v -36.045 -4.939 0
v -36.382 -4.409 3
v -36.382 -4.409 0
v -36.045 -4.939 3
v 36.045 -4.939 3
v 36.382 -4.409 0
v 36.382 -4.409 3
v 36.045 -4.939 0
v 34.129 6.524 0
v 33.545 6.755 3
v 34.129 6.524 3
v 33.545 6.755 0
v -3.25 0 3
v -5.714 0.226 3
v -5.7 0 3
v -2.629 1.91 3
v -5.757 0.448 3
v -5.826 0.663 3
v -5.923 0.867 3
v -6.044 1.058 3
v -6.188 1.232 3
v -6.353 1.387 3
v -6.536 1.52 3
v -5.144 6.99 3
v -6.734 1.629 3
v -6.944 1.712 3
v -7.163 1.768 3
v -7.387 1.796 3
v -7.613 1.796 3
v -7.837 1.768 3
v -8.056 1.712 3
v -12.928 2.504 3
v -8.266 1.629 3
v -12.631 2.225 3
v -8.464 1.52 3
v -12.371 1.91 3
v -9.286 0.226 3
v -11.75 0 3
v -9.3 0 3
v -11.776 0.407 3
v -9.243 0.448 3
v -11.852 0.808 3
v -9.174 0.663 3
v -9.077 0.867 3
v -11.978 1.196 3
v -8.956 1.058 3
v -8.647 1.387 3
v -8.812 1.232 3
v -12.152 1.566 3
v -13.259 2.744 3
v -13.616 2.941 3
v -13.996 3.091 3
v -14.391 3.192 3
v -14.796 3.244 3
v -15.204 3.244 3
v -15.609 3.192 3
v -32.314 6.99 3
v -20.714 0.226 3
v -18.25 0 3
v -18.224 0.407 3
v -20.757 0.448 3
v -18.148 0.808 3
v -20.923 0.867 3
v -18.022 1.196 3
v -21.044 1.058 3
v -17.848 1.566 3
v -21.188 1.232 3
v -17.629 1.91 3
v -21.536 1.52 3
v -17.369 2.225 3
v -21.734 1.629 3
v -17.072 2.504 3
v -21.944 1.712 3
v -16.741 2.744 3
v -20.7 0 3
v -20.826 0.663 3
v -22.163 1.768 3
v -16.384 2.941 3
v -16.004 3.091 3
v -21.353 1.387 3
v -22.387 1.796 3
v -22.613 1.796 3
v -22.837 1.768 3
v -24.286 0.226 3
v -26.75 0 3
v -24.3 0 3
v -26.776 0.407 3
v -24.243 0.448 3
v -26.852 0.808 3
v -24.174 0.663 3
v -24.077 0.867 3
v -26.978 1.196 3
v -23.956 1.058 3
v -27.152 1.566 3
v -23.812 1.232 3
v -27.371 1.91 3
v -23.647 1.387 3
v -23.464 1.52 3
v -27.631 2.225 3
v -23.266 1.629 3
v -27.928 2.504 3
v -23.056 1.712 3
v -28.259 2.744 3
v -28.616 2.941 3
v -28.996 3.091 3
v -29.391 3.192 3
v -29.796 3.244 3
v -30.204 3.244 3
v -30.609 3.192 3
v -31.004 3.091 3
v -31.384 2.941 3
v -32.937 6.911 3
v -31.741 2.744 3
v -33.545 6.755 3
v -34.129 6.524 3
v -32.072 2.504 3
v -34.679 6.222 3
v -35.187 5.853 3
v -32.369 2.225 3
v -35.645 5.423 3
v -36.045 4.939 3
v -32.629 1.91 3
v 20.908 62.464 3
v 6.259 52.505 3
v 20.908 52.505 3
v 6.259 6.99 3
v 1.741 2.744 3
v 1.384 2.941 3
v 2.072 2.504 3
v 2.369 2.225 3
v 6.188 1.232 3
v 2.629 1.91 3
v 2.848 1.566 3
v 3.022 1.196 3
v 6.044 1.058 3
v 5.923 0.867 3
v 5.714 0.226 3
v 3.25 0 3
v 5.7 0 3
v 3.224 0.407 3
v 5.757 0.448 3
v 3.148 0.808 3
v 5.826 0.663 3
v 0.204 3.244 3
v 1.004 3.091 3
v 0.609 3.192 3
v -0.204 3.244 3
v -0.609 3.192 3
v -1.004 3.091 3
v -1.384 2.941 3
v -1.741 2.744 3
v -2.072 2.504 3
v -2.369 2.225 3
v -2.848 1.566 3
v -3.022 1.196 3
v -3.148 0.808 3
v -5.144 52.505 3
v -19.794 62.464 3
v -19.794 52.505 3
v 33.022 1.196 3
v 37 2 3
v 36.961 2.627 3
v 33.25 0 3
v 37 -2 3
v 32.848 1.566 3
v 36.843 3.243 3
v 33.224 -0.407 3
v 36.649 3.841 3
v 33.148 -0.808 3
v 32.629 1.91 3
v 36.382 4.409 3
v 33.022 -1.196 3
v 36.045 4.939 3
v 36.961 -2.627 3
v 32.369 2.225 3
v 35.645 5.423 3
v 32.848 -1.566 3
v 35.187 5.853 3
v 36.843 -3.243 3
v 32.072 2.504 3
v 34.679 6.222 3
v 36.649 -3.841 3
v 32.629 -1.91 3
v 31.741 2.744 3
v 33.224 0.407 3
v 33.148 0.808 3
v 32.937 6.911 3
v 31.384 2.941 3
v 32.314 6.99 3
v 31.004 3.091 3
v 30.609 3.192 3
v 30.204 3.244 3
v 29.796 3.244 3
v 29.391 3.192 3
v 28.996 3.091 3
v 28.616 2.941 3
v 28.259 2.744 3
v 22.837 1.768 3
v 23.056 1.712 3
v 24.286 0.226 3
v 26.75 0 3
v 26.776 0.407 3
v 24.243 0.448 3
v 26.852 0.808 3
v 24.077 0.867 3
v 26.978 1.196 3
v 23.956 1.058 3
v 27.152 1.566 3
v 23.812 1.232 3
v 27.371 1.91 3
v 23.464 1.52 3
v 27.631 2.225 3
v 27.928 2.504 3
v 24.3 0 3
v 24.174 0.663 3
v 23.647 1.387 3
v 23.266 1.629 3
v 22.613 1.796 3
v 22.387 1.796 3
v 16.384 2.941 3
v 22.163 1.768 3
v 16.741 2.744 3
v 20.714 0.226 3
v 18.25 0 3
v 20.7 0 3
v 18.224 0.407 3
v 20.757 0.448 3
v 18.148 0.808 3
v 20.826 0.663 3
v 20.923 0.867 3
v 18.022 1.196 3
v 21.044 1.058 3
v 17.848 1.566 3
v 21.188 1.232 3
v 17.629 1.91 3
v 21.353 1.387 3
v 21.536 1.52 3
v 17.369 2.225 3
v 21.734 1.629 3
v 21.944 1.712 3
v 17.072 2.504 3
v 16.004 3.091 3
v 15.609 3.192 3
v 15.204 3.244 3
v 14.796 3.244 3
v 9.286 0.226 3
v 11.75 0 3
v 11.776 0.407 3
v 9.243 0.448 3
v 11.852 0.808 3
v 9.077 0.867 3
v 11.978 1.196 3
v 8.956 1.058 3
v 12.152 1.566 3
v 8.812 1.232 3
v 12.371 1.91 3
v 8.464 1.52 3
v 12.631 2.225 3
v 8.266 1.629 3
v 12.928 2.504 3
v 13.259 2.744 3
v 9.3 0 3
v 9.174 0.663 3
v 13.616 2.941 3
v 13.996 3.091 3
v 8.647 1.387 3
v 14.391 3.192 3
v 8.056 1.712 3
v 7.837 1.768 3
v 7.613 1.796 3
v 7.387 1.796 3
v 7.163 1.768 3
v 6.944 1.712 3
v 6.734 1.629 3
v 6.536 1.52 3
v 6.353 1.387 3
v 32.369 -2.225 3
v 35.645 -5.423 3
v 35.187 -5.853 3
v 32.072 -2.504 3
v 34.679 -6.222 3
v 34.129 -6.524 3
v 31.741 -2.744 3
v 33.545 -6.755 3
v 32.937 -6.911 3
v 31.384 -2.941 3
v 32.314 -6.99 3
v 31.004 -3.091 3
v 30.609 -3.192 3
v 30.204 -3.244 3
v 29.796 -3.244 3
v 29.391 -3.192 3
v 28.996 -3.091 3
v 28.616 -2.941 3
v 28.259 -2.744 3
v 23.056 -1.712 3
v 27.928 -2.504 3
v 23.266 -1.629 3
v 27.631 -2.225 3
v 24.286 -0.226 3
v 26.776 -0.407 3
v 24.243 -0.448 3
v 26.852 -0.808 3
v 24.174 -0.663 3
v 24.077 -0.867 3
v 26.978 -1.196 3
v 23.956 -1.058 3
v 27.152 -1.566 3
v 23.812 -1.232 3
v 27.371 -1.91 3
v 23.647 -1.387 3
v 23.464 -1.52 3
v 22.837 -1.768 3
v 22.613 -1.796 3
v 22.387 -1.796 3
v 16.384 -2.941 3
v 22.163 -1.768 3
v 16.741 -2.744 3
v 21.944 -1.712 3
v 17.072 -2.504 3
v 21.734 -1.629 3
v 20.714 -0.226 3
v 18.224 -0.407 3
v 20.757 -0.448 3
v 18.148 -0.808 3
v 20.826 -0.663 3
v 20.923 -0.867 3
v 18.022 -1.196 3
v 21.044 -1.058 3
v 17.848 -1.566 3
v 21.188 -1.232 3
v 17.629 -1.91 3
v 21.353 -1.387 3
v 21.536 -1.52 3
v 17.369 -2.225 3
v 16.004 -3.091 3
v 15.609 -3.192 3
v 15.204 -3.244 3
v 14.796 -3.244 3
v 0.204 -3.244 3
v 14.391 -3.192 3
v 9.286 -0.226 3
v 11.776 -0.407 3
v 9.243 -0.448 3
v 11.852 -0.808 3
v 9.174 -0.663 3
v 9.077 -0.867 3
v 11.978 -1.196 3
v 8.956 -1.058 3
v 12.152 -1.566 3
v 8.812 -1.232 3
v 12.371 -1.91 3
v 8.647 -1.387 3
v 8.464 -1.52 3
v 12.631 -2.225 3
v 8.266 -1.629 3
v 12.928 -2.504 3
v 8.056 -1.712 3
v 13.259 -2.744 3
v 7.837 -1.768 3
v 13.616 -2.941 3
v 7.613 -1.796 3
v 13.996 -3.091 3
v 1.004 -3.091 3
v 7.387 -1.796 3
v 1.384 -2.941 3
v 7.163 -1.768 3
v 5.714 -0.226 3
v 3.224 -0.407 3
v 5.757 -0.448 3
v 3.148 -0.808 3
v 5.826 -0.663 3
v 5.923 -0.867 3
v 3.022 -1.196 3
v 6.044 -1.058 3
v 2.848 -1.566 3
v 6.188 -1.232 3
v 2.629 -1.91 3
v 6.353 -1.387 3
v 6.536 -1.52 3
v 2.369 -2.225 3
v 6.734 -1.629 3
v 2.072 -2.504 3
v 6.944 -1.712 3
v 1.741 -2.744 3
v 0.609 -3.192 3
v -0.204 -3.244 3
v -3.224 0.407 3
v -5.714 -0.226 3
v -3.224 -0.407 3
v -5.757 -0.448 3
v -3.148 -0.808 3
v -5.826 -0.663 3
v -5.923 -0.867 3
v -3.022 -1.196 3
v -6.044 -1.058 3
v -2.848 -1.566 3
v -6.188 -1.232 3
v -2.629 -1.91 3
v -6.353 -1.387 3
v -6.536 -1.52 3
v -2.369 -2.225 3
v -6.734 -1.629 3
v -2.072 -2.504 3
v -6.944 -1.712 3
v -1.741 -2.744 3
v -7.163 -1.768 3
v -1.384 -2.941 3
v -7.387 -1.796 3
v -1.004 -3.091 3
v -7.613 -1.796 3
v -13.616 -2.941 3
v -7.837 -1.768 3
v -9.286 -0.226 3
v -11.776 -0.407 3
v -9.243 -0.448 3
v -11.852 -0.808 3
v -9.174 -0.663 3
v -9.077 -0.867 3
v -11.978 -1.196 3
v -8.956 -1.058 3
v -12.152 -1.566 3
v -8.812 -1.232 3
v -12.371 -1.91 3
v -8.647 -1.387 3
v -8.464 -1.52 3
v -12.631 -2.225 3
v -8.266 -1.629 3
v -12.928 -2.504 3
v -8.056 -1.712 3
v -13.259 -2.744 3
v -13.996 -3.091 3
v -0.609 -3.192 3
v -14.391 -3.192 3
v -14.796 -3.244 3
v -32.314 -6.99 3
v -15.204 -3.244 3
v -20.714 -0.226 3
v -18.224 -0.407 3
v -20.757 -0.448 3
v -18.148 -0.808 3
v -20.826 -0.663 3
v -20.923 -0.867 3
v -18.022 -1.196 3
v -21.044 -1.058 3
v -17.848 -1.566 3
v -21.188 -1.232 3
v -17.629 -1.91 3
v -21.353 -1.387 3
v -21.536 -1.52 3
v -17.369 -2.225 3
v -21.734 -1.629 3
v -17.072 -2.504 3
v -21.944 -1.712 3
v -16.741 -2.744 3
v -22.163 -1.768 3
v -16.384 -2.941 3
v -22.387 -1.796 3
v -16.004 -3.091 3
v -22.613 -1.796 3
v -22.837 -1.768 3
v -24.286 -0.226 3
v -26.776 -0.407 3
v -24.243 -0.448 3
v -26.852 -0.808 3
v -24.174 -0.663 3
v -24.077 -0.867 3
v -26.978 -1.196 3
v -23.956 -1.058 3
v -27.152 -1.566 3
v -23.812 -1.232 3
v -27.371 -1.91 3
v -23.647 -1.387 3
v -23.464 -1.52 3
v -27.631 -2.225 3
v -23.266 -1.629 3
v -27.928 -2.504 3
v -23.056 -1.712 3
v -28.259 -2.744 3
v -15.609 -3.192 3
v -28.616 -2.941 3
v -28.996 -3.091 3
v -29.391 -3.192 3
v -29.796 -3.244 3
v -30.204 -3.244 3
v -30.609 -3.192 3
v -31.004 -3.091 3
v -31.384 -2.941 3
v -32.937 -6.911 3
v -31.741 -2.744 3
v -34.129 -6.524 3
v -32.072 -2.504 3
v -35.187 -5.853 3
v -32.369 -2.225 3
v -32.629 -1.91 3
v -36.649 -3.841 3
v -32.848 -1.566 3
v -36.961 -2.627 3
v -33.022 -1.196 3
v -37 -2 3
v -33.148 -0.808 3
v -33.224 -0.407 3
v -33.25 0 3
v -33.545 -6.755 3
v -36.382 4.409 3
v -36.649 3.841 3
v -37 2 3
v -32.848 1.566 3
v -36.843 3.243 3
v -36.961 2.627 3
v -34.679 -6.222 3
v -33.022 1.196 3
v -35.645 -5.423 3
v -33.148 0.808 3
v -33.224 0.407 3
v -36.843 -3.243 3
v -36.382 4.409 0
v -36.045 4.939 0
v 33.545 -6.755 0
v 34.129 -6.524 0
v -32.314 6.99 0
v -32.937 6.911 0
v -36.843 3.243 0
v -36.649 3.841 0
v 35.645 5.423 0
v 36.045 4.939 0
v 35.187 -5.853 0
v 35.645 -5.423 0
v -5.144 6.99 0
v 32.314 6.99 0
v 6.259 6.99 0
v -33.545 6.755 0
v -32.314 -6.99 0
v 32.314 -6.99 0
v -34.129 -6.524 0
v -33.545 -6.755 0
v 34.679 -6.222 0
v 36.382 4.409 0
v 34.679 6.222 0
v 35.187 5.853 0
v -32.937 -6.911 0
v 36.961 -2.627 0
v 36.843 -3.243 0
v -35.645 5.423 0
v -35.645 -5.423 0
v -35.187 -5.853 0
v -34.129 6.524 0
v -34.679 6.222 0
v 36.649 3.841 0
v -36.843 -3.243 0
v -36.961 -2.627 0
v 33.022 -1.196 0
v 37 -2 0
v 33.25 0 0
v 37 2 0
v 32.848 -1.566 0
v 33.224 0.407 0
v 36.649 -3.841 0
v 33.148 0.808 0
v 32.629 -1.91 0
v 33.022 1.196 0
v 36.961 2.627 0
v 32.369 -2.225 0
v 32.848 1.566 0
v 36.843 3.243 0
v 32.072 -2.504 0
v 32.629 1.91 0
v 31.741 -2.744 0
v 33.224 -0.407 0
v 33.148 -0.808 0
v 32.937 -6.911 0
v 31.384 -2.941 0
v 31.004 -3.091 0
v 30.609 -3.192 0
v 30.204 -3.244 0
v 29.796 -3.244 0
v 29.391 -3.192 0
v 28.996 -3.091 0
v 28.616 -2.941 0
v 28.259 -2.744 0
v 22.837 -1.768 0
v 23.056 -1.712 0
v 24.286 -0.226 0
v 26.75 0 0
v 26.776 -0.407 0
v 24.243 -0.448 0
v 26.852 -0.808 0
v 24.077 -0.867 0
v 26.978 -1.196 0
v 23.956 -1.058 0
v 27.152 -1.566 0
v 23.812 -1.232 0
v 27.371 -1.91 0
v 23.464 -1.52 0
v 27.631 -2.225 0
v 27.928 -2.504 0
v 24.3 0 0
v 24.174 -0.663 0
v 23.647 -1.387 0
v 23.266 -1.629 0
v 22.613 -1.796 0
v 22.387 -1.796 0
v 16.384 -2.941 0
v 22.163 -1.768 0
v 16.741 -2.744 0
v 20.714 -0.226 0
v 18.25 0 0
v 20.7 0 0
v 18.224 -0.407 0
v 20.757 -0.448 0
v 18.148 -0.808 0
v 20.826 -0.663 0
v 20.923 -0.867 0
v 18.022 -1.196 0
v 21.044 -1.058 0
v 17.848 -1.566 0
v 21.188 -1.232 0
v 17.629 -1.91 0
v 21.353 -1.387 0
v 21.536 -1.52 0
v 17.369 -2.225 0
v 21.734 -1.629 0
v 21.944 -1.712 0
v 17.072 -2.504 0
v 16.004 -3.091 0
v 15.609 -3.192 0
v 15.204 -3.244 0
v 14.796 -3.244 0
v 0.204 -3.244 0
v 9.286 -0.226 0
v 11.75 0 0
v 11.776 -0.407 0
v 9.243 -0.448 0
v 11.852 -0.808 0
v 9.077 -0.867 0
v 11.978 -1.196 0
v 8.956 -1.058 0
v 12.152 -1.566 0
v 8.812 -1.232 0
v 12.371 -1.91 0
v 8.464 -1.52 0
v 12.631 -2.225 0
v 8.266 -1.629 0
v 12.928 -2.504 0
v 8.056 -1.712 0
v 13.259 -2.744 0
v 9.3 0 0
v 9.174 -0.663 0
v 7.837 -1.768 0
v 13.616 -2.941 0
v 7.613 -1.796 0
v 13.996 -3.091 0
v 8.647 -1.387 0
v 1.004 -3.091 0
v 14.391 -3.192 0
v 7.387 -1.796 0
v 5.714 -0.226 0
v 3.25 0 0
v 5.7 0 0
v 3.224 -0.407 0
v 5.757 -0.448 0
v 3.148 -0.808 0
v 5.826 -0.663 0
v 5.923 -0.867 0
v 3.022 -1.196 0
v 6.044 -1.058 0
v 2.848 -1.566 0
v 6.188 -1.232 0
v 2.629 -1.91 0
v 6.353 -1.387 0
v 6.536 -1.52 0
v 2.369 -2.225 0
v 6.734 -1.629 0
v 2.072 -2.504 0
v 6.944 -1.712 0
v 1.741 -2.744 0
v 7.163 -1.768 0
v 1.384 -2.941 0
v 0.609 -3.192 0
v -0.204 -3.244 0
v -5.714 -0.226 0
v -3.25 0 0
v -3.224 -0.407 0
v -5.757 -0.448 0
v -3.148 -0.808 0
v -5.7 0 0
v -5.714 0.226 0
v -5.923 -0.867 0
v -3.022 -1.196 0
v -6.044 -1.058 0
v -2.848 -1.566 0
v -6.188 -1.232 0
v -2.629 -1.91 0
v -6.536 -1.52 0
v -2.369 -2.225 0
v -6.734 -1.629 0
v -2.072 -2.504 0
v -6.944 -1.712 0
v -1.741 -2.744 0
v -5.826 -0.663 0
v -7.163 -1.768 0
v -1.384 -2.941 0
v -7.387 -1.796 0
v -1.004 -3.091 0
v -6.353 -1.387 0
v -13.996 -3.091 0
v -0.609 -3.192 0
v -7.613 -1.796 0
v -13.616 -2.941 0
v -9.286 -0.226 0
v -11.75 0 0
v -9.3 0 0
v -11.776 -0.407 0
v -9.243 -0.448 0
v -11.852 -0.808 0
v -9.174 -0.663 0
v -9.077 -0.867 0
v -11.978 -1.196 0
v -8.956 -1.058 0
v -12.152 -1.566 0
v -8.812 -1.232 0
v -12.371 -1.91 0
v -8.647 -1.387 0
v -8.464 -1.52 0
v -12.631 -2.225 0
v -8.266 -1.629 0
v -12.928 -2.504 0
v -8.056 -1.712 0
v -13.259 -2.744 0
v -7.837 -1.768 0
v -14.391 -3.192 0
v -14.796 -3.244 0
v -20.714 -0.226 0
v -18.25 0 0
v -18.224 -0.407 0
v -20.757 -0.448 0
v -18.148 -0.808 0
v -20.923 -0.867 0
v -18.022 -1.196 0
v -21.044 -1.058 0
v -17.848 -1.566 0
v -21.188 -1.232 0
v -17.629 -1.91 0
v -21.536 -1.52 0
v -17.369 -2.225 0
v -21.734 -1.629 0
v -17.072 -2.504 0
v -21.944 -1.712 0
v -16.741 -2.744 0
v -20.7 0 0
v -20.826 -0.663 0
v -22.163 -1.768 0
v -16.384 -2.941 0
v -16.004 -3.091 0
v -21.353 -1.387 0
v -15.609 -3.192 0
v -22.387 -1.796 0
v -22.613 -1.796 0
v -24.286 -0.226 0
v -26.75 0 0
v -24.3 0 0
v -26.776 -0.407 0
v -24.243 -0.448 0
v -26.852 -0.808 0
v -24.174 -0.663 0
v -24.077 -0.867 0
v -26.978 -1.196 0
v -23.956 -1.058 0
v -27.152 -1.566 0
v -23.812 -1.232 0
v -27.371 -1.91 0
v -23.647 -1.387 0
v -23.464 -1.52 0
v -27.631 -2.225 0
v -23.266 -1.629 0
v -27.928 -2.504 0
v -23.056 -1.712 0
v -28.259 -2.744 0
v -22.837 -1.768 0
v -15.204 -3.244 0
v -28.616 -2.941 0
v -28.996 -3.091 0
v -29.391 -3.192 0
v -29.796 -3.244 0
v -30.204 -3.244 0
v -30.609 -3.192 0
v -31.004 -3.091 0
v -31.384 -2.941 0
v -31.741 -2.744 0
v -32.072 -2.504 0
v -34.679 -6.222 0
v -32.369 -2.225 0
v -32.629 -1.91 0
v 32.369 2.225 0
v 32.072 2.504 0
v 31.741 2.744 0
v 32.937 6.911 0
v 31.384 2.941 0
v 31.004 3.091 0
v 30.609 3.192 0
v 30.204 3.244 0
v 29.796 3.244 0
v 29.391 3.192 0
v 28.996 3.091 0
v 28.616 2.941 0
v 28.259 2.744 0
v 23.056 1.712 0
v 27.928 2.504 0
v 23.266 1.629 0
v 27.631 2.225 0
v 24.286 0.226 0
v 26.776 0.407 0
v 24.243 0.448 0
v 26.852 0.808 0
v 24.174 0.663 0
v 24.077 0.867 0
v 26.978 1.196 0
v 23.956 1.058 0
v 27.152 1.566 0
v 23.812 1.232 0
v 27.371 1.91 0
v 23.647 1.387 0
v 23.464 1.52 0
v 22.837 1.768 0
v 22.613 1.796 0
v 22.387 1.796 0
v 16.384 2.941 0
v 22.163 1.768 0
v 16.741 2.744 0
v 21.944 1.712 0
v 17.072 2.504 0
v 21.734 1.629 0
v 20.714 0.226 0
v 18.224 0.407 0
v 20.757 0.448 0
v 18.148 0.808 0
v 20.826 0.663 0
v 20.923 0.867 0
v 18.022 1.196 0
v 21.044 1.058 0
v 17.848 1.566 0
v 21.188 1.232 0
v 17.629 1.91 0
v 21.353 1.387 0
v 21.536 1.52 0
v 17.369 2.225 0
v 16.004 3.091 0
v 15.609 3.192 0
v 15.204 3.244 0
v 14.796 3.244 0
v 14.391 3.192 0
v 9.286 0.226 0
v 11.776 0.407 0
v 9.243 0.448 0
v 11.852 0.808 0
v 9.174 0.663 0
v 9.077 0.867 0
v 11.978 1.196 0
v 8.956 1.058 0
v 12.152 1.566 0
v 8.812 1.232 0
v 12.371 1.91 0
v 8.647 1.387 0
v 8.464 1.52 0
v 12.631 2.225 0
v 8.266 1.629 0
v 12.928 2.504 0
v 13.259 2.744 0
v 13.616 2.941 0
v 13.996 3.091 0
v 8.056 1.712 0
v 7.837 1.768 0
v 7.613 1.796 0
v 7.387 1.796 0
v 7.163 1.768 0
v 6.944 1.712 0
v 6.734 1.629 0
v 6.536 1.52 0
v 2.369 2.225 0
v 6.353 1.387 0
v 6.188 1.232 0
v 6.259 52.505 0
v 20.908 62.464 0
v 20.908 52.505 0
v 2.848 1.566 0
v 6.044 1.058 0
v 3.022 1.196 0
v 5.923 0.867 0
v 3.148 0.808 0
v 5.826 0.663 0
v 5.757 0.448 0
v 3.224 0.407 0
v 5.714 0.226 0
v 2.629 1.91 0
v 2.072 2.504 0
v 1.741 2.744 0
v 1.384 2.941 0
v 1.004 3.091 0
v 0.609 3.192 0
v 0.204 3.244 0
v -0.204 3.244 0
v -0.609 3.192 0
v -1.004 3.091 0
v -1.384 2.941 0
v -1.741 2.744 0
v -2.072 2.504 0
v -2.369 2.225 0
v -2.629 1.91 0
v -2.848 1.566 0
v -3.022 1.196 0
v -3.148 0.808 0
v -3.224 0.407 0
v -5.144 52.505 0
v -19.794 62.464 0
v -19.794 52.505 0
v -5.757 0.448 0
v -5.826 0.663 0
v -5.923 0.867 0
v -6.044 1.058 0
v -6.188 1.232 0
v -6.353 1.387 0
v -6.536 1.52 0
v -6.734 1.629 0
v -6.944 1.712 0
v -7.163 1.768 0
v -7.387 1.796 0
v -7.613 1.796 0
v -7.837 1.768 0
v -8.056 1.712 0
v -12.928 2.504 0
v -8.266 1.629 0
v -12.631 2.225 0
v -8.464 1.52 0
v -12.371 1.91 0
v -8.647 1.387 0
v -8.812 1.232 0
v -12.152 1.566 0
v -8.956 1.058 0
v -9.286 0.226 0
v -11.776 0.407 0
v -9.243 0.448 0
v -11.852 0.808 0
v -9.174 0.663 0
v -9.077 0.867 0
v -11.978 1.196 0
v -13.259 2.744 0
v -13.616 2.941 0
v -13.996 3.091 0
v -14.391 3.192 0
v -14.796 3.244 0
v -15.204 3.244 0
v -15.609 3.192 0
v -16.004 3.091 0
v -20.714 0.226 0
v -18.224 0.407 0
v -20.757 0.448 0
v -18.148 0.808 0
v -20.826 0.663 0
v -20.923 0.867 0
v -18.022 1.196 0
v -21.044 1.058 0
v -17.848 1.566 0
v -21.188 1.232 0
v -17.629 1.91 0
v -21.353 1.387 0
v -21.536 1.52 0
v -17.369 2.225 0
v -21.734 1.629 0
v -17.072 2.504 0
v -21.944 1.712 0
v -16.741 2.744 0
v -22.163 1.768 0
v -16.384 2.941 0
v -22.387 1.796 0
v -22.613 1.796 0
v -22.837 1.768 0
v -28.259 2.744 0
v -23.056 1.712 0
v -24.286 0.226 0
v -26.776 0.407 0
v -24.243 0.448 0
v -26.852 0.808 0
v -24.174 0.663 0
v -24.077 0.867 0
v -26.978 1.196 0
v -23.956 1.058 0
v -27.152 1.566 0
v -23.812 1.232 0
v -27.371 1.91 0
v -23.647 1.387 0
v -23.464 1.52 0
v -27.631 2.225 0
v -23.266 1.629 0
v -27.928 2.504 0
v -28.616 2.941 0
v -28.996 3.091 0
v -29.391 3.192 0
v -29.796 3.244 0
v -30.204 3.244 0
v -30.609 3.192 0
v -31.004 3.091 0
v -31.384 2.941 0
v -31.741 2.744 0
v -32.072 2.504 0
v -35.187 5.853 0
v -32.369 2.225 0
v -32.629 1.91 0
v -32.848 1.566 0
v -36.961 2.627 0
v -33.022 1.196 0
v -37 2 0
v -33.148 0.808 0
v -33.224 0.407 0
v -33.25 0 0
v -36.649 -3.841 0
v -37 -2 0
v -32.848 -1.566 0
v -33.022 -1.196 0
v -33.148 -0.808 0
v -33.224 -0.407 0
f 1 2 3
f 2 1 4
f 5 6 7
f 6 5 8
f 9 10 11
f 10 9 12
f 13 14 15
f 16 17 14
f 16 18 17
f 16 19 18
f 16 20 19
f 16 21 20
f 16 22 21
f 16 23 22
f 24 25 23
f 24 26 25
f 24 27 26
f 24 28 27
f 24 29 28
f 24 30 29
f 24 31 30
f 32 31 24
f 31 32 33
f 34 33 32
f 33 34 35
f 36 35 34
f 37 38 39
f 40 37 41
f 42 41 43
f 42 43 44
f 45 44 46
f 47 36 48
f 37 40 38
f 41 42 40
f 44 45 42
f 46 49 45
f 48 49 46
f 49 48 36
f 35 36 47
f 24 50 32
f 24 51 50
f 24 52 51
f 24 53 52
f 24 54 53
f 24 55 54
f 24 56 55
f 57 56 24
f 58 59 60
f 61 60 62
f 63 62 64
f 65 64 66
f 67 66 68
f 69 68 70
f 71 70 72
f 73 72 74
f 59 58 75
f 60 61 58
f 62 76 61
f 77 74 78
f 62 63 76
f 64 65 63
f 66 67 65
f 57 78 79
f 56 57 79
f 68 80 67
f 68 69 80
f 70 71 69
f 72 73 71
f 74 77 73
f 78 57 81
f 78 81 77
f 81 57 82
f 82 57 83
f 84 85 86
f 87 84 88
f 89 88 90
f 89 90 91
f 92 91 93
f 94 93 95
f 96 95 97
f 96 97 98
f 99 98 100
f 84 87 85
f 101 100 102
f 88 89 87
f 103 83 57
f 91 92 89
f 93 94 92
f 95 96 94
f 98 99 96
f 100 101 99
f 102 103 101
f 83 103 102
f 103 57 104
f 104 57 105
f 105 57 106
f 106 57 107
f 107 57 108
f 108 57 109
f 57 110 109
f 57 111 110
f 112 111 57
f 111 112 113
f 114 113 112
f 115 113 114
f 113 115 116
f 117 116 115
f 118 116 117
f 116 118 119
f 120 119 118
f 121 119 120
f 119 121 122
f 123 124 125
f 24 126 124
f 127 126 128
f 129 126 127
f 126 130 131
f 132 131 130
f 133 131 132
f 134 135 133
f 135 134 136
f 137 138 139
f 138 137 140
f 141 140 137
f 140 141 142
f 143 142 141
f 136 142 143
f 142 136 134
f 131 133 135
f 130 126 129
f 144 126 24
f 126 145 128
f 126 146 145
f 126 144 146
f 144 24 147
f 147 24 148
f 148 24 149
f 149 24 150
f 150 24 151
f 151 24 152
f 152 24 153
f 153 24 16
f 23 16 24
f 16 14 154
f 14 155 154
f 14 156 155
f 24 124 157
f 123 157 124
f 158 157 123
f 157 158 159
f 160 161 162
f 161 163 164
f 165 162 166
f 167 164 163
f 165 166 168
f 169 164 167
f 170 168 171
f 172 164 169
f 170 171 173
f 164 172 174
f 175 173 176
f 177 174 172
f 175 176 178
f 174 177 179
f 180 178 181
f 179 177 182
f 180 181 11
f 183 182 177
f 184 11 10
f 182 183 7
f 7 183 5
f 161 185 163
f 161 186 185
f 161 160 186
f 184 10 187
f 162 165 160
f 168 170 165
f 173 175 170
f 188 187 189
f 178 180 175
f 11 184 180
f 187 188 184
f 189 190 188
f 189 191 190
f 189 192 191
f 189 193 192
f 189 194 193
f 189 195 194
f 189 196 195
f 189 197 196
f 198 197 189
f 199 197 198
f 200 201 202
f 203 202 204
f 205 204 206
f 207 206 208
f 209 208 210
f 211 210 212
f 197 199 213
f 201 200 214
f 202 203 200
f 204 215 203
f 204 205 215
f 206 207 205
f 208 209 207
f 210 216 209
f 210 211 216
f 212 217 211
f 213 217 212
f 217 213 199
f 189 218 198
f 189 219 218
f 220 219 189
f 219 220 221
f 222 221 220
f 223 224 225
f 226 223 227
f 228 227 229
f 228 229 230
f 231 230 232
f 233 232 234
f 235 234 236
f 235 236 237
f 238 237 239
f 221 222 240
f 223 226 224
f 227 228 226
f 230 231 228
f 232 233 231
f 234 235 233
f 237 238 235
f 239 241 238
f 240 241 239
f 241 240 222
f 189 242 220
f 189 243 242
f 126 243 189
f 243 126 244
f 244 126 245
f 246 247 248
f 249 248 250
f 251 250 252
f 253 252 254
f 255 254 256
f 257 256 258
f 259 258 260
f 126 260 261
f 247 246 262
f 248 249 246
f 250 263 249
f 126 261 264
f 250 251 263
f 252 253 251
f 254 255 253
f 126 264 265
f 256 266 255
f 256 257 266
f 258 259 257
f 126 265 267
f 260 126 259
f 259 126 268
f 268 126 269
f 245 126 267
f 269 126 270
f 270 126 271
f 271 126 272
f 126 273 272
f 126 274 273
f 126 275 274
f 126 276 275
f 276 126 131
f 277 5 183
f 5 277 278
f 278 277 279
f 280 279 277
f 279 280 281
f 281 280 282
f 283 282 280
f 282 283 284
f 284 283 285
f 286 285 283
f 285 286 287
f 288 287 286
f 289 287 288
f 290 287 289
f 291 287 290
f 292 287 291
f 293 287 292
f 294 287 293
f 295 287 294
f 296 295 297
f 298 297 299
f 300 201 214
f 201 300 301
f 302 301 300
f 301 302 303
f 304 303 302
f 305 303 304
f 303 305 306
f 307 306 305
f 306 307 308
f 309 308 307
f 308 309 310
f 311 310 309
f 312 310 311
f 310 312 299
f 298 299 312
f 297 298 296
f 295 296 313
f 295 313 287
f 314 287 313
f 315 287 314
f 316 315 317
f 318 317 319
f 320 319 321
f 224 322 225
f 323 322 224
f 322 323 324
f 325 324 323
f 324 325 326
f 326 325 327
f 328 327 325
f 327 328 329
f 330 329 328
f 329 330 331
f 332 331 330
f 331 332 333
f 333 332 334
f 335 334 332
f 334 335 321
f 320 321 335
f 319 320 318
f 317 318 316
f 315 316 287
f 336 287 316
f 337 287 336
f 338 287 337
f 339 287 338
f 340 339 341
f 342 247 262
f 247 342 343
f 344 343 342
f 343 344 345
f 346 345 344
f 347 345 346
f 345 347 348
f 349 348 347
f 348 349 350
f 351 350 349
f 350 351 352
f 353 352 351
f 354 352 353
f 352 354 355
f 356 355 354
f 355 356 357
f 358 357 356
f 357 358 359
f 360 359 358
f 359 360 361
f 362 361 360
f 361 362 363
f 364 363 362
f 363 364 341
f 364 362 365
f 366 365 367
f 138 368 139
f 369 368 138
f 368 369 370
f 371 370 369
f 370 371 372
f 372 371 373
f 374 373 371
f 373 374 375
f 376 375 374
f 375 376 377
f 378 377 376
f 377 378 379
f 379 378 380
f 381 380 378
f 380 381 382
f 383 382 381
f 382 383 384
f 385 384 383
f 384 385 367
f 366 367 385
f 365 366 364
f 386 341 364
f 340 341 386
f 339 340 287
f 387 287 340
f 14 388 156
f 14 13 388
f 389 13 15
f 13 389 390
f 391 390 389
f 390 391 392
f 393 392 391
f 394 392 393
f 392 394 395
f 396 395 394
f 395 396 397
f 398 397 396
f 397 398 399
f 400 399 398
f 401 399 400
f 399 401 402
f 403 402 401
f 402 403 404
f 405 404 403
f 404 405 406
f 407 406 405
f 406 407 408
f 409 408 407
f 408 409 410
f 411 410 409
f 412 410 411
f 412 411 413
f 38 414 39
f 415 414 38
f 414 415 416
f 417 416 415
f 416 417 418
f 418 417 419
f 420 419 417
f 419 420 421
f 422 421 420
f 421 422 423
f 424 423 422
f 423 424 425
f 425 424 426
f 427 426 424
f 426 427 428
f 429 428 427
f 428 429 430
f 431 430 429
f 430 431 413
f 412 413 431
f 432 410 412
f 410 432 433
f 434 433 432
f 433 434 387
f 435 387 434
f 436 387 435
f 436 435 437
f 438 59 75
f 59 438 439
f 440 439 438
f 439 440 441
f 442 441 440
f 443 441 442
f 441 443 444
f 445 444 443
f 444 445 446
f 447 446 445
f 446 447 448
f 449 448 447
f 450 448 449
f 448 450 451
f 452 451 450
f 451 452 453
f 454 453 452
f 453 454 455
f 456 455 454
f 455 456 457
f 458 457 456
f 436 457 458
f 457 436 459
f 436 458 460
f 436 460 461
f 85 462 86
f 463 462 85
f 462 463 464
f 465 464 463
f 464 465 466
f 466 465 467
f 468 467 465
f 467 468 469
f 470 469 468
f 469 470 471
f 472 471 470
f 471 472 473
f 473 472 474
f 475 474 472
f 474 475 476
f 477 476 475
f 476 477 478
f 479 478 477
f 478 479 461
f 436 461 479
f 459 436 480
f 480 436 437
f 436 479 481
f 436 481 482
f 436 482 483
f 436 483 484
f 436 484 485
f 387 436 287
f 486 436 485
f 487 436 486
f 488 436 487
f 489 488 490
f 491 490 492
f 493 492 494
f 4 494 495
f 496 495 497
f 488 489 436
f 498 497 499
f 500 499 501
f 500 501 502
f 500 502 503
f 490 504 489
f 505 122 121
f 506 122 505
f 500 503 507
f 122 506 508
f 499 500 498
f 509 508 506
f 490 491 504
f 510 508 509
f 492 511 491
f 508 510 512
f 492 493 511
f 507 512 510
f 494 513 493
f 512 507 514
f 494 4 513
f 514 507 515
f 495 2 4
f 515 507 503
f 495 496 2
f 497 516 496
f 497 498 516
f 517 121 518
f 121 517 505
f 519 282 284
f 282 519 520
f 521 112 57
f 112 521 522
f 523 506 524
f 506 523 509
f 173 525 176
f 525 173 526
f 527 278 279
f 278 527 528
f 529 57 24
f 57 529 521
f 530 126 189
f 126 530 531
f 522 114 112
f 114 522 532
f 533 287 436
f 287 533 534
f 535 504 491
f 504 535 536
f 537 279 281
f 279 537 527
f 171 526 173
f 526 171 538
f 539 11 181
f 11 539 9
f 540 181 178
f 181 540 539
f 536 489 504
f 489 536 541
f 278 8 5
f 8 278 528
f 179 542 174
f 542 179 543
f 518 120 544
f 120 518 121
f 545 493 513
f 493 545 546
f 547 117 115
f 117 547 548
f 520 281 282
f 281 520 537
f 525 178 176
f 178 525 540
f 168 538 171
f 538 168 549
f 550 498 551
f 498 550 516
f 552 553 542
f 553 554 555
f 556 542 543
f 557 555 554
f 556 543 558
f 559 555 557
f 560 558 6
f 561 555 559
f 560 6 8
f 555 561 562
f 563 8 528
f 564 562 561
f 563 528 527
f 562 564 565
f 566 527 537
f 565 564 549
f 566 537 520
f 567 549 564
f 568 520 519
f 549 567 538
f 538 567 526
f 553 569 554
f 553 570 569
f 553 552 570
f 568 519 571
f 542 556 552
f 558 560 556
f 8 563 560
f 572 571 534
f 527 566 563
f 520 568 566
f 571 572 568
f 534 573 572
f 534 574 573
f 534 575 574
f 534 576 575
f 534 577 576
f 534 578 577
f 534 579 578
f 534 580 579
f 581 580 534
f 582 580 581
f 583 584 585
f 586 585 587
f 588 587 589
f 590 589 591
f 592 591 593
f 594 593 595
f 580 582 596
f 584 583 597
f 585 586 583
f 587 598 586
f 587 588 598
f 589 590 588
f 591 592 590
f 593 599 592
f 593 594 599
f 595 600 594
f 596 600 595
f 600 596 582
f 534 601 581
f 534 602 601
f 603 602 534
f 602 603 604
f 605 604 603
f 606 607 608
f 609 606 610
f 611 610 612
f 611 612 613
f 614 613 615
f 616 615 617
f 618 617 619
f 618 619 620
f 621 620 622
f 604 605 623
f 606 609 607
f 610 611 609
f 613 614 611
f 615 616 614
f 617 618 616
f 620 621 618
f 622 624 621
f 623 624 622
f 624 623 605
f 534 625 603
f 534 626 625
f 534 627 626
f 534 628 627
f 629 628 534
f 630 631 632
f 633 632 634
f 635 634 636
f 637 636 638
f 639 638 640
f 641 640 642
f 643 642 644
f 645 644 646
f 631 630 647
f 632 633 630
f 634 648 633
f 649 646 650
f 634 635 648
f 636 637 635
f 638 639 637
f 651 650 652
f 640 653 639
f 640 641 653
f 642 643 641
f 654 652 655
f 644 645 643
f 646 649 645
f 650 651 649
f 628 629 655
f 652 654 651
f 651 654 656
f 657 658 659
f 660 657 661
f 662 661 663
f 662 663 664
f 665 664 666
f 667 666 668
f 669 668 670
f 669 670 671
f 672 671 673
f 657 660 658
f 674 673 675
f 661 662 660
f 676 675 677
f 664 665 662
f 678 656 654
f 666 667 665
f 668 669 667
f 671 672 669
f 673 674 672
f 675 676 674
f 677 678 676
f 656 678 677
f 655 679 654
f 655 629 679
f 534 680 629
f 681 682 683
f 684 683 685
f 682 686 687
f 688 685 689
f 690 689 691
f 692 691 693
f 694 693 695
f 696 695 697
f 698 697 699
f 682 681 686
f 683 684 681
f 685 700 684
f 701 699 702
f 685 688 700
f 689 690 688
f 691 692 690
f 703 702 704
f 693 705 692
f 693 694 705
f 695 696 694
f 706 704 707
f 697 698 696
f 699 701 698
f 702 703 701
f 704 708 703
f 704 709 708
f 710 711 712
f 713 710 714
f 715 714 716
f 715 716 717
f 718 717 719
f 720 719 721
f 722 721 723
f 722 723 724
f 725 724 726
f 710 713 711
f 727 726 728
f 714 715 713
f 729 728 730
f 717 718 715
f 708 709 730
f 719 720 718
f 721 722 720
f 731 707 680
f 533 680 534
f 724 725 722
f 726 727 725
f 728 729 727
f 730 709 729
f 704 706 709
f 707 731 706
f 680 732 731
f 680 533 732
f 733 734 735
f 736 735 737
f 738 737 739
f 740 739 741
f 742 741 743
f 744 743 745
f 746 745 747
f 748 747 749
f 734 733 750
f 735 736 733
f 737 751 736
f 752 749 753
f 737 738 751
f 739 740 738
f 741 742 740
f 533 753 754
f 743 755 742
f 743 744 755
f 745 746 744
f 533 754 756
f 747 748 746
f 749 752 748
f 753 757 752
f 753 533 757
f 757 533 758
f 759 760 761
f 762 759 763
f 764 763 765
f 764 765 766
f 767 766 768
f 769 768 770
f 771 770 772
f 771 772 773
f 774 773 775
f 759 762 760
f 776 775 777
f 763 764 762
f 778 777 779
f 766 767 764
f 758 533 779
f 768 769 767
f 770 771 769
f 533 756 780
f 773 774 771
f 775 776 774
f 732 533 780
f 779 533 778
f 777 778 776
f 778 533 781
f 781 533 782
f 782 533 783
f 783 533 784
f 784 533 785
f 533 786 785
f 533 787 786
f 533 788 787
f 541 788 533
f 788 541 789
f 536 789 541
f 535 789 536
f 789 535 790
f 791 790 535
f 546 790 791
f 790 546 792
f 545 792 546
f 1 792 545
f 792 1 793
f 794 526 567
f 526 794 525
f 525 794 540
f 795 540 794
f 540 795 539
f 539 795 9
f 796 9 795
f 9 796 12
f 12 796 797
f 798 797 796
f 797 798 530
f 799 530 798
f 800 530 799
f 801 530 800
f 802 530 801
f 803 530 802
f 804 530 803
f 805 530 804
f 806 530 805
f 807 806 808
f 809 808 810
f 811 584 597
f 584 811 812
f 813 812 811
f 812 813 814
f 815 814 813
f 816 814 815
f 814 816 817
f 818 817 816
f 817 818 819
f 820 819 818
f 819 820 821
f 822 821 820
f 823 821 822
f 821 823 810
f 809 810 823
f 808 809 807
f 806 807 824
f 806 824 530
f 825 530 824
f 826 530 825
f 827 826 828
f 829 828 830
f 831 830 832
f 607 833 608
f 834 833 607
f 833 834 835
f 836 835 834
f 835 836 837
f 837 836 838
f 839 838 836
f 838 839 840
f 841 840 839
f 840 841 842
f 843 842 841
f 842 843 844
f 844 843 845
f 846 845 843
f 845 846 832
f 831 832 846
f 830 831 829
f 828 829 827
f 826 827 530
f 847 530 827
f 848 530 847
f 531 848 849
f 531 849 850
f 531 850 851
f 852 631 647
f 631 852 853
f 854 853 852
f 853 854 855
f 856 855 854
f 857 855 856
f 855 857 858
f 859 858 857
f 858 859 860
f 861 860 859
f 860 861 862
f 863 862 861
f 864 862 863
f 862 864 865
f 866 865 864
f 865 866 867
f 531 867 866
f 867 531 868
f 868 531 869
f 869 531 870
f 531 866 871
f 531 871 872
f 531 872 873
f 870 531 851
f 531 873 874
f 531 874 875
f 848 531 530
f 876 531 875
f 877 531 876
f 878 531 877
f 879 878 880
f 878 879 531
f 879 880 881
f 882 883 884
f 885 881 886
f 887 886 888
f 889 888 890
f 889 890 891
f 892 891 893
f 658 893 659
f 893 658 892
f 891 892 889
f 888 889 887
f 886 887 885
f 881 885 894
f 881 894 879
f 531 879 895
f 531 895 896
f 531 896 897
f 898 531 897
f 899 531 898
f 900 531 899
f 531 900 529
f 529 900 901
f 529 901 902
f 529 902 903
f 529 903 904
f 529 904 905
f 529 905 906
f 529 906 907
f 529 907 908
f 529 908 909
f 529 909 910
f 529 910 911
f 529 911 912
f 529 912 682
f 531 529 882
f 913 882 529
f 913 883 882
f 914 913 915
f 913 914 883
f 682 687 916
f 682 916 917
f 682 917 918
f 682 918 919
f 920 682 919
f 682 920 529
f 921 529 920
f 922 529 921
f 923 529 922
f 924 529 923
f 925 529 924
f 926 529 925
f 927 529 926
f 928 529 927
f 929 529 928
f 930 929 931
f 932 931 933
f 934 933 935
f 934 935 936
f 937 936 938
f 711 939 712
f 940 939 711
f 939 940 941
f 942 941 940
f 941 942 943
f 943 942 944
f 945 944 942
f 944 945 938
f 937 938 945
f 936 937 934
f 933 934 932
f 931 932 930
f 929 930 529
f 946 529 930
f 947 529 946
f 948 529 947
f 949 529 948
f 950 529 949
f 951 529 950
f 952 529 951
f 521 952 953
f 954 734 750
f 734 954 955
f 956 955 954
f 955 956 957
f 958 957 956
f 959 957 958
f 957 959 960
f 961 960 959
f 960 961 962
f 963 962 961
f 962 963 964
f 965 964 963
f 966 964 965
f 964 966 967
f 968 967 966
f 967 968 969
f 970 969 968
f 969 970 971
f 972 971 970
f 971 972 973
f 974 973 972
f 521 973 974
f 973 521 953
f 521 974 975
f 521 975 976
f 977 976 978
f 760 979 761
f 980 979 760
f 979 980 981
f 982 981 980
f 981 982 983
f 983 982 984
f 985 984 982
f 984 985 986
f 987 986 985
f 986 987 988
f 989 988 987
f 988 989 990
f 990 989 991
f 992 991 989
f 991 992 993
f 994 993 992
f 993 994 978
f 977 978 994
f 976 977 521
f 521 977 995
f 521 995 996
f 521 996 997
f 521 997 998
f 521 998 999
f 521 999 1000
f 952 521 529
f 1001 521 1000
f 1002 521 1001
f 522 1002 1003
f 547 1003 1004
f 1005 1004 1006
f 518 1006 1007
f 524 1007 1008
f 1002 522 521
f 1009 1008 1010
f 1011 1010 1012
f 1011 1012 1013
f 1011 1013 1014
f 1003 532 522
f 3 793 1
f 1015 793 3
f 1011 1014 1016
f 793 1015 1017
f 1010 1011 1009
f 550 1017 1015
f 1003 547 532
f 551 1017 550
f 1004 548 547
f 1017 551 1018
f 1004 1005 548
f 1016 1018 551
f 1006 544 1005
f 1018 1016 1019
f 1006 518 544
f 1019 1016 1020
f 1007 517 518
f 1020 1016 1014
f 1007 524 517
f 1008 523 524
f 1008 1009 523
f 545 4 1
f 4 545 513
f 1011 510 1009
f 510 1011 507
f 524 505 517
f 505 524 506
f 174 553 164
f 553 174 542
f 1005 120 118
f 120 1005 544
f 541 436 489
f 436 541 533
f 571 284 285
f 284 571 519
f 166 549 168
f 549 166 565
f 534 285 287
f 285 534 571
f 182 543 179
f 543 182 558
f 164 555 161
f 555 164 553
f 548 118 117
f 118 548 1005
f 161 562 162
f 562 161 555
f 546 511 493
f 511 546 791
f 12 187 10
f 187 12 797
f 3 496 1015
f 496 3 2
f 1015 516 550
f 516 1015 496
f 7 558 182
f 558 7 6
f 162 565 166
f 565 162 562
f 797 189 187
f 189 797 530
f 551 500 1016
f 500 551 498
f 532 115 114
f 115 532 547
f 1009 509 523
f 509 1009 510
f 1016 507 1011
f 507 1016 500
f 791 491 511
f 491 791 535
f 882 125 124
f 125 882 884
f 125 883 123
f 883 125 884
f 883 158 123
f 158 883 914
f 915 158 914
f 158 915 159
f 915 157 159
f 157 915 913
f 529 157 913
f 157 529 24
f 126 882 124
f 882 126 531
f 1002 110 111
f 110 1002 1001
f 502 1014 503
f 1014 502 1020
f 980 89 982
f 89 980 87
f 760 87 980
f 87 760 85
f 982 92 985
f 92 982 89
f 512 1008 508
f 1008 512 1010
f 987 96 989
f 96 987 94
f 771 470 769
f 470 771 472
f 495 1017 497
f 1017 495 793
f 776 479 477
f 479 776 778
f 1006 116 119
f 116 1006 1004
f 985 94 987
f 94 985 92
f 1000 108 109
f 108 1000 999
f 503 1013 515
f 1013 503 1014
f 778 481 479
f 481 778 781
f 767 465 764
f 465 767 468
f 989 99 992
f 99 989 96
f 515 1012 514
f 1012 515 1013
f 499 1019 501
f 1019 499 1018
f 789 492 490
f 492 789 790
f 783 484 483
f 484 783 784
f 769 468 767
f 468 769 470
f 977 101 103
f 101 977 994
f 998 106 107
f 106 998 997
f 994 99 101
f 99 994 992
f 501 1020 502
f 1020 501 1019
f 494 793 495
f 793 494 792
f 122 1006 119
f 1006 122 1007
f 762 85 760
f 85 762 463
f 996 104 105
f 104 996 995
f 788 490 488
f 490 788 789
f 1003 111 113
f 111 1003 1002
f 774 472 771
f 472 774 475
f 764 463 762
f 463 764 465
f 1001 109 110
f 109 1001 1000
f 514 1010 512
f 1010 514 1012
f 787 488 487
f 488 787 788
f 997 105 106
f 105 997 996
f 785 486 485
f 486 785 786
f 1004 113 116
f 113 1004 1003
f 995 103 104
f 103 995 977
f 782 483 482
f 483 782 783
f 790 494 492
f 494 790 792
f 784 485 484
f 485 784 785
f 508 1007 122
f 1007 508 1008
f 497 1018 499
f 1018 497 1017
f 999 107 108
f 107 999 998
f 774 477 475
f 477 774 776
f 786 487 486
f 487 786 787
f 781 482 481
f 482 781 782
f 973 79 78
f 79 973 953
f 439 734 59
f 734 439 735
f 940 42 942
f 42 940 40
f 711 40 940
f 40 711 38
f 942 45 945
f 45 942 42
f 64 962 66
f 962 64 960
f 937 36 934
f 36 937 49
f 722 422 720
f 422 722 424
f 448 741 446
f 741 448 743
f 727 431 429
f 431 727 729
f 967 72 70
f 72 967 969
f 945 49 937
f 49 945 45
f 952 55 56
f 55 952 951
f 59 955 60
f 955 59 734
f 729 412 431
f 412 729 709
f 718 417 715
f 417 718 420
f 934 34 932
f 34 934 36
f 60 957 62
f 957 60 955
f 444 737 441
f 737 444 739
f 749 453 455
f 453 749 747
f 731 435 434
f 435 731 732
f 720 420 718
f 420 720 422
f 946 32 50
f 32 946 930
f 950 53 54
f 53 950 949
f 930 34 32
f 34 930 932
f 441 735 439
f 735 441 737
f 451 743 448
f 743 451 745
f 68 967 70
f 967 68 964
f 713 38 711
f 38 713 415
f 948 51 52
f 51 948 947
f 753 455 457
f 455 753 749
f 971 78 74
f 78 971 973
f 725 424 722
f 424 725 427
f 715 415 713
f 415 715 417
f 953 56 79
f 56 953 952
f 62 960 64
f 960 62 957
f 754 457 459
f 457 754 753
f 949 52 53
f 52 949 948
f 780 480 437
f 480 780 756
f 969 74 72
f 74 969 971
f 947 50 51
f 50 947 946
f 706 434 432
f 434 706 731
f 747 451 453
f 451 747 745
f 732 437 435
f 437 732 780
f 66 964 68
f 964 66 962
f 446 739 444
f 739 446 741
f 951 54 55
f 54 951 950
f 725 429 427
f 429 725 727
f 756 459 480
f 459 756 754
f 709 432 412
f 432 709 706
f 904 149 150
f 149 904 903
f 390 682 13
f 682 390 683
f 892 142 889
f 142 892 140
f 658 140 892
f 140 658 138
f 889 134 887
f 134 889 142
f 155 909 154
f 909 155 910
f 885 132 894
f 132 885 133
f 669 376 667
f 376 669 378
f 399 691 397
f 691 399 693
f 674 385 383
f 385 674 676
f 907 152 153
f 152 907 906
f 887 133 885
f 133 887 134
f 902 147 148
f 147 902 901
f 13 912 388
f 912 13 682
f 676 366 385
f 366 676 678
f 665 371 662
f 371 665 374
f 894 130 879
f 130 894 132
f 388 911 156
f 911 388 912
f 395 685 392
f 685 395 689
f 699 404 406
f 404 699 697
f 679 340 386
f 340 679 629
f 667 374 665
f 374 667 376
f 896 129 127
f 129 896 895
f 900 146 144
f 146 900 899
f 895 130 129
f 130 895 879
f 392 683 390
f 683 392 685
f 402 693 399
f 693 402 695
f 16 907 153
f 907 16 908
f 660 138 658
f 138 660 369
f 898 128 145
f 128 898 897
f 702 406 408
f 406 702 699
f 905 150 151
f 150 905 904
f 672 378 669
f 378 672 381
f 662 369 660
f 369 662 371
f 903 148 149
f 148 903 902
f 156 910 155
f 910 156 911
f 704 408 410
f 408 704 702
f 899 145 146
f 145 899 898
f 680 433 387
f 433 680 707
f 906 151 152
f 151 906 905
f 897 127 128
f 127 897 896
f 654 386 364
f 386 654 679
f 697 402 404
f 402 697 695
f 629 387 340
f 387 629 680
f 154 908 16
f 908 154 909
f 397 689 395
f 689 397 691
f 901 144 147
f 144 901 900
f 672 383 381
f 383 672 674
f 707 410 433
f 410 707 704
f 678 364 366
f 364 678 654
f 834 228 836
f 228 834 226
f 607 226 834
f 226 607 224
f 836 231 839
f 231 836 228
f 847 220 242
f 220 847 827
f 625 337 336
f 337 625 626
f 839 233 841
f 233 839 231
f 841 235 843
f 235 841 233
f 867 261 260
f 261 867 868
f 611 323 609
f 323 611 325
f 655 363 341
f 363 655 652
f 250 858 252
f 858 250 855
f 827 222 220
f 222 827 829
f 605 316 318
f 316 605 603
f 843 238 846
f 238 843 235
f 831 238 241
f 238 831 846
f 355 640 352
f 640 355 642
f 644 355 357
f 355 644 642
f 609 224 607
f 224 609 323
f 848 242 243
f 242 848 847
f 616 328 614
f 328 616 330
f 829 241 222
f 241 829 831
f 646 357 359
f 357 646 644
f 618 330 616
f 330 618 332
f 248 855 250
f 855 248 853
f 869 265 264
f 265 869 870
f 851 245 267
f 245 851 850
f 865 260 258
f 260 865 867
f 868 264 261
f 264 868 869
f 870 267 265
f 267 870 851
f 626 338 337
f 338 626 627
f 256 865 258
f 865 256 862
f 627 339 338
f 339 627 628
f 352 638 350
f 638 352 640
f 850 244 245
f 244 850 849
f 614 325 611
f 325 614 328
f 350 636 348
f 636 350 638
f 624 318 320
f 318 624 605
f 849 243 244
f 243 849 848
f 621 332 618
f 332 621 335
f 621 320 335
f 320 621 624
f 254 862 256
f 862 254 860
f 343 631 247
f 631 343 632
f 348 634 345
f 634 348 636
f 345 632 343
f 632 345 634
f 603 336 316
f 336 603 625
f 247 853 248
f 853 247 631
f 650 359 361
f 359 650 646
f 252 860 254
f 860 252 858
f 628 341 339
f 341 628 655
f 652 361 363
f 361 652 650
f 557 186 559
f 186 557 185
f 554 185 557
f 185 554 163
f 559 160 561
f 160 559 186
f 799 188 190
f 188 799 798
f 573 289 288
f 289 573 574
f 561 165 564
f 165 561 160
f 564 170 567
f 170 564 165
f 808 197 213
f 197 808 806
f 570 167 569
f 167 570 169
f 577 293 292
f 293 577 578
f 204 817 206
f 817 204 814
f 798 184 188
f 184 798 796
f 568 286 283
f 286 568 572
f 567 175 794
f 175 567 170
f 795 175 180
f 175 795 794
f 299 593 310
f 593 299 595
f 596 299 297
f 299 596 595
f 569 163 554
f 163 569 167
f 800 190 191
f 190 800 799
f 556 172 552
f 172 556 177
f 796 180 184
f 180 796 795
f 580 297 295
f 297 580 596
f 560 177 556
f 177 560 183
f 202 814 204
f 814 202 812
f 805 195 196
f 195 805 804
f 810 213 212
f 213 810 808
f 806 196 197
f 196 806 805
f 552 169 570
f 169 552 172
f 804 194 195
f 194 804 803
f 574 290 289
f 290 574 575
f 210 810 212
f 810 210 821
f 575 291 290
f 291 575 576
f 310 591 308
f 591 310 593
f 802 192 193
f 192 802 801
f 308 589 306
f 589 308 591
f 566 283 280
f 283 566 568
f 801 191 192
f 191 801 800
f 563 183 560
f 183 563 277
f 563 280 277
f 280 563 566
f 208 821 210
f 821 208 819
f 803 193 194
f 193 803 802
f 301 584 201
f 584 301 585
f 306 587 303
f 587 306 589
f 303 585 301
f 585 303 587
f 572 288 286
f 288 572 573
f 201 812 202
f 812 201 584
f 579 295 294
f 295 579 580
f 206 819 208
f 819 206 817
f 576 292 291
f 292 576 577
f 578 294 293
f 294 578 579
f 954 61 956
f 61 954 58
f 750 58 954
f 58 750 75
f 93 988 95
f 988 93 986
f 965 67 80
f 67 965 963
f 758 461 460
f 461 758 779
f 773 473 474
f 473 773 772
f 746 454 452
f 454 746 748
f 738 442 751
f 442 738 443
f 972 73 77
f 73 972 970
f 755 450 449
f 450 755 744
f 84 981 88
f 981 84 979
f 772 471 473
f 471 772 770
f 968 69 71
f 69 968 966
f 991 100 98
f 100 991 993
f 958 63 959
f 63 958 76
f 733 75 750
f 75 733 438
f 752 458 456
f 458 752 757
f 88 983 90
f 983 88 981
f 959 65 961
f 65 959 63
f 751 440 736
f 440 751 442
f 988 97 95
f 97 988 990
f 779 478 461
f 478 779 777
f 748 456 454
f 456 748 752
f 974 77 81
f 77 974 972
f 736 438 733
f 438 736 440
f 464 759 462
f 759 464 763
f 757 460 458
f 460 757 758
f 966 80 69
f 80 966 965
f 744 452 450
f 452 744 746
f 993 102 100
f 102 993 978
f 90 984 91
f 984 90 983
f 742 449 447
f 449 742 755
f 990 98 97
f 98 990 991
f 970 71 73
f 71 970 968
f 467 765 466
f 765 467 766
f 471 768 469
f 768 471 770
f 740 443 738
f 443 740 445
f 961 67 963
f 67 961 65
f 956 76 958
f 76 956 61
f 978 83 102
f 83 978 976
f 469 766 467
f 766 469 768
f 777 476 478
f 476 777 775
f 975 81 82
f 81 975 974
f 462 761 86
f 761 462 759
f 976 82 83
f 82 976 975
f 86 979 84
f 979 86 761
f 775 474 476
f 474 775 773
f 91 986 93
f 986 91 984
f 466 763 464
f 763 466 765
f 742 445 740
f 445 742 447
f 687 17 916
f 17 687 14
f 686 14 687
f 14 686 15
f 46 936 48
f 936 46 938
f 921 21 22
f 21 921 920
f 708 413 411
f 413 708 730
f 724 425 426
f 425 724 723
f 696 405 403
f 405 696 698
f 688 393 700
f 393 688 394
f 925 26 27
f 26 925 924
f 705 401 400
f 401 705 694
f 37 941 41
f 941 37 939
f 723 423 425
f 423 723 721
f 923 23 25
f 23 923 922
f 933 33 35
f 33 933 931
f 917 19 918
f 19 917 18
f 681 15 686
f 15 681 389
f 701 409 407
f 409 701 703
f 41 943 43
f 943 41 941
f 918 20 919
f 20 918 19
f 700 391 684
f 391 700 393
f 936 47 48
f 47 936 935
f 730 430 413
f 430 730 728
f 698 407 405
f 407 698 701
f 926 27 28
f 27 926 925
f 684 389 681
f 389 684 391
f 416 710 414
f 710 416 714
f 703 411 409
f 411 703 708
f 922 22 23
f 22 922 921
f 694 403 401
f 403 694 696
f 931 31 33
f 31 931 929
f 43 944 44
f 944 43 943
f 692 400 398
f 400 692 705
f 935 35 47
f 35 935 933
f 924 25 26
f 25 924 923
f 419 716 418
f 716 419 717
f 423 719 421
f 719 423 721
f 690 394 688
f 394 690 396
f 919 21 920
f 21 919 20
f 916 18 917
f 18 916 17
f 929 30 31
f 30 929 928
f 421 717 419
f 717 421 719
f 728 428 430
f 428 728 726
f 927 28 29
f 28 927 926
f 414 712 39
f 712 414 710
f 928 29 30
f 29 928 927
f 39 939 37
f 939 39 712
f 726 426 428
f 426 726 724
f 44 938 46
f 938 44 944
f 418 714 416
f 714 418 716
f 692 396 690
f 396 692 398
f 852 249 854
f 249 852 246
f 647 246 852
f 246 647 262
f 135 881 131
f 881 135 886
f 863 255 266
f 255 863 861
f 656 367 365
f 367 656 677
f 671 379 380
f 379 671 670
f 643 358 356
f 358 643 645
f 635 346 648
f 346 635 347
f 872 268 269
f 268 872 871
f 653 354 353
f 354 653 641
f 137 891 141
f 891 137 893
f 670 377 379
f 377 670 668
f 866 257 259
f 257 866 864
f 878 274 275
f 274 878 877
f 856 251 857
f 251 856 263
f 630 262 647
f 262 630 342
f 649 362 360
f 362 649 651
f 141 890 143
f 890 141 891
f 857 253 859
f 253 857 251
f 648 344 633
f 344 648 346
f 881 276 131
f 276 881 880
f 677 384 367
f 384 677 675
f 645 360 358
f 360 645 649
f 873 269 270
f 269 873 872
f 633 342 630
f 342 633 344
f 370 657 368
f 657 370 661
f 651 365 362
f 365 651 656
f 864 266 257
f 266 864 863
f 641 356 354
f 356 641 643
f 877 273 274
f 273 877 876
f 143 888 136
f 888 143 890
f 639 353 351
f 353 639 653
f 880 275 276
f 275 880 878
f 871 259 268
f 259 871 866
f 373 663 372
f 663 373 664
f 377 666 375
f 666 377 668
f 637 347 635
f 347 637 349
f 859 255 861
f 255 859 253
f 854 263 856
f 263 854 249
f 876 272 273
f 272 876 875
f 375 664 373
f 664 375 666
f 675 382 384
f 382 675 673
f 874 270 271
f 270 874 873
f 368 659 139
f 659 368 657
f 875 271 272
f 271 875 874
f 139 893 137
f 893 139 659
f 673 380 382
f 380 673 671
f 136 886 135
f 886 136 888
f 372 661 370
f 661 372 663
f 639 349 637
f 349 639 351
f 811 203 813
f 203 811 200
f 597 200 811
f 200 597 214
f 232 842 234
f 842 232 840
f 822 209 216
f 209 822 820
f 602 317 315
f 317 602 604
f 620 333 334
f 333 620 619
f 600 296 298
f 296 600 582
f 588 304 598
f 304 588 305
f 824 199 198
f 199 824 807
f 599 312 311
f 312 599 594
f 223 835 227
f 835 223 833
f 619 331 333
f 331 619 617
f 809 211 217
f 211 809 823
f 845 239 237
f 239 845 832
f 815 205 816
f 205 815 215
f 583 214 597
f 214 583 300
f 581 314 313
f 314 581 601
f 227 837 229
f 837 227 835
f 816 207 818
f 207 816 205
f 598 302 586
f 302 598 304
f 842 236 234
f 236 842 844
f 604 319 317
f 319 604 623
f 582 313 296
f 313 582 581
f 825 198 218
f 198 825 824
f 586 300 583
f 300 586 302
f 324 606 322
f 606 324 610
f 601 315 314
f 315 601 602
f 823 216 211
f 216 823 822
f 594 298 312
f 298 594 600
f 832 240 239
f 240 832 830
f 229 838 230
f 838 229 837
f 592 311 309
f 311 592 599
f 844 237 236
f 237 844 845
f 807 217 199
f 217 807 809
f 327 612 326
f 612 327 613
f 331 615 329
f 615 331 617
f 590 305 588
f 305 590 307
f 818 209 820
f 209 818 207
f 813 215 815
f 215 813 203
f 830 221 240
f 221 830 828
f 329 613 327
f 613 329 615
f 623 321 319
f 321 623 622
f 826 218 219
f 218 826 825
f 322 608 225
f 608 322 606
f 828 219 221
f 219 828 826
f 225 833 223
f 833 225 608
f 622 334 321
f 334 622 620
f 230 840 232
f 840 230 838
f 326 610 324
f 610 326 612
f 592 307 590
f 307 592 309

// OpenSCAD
$fn = 50;


difference() {
	union() {
		hull() {
			translate(v = [-32.0000000000, 2.0000000000, 0]) {
				cylinder(h = 3, r = 5);
			}
			translate(v = [32.0000000000, 2.0000000000, 0]) {
				cylinder(h = 3, r = 5);
			}
			translate(v = [-32.0000000000, -2.0000000000, 0]) {
				cylinder(h = 3, r = 5);
			}
			translate(v = [32.0000000000, -2.0000000000, 0]) {
				cylinder(h = 3, r = 5);
			}
		}
		translate(v = [0, 61.1111111111, 0]) {
			linear_extrude(height = 3) {
				text(font = "DejaVu Sans Mono:style=Bold", halign = "center", size = 57.0000000000, text = "T", valign = "top");
			}
		}
	}
	union() {
		translate(v = [-30.0000000000, 0.0000000000, 0]) {
			translate(v = [0, 0, -100]) {
				cylinder(h = 200, r = 3.2500000000);
			}
		}
		translate(v = [-15.0000000000, 0.0000000000, 0]) {
			translate(v = [0, 0, -100]) {
				cylinder(h = 200, r = 3.2500000000);
			}
		}
		translate(v = [0, 0, -100]) {
			cylinder(h = 200, r = 3.2500000000);
		}
		translate(v = [15.0000000000, 0.0000000000, 0]) {
			translate(v = [0, 0, -100]) {
				cylinder(h = 200, r = 3.2500000000);
			}
		}
		translate(v = [30.0000000000, 0.0000000000, 0]) {
			translate(v = [0, 0, -100]) {
				cylinder(h = 200, r = 3.2500000000);
			}
		}
		translate(v = [-30.0000000000, 0.0000000000, 0]) {
			translate(v = [0, 0, -100]) {
				cylinder(h = 200, r = 1.8000000000);
			}
		}
		translate(v = [-22.5000000000, 0.0000000000, 0]) {
			translate(v = [0, 0, -100]) {
				cylinder(h = 200, r = 1.8000000000);
			}
		}
		translate(v = [-15.0000000000, 0.0000000000, 0]) {
			translate(v = [0, 0, -100]) {
				cylinder(h = 200, r = 1.8000000000);
			}
		}
		translate(v = [-7.5000000000, 0.0000000000, 0]) {
			translate(v = [0, 0, -100]) {
				cylinder(h = 200, r = 1.8000000000);
			}
		}
		translate(v = [0, 0, -100]) {
			cylinder(h = 200, r = 1.8000000000);
		}
		translate(v = [7.5000000000, 0.0000000000, 0]) {
			translate(v = [0, 0, -100]) {
				cylinder(h = 200, r = 1.8000000000);
			}
		}
		translate(v = [15.0000000000, 0.0000000000, 0]) {
			translate(v = [0, 0, -100]) {
				cylinder(h = 200, r = 1.8000000000);
			}
		}
		translate(v = [22.5000000000, 0.0000000000, 0]) {
			translate(v = [0, 0, -100]) {
				cylinder(h = 200, r = 1.8000000000);
			}
		}
		translate(v = [30.0000000000, 0.0000000000, 0]) {
			translate(v = [0, 0, -100]) {
				cylinder(h = 200, r = 1.8000000000);
			}
		}
	}
}
